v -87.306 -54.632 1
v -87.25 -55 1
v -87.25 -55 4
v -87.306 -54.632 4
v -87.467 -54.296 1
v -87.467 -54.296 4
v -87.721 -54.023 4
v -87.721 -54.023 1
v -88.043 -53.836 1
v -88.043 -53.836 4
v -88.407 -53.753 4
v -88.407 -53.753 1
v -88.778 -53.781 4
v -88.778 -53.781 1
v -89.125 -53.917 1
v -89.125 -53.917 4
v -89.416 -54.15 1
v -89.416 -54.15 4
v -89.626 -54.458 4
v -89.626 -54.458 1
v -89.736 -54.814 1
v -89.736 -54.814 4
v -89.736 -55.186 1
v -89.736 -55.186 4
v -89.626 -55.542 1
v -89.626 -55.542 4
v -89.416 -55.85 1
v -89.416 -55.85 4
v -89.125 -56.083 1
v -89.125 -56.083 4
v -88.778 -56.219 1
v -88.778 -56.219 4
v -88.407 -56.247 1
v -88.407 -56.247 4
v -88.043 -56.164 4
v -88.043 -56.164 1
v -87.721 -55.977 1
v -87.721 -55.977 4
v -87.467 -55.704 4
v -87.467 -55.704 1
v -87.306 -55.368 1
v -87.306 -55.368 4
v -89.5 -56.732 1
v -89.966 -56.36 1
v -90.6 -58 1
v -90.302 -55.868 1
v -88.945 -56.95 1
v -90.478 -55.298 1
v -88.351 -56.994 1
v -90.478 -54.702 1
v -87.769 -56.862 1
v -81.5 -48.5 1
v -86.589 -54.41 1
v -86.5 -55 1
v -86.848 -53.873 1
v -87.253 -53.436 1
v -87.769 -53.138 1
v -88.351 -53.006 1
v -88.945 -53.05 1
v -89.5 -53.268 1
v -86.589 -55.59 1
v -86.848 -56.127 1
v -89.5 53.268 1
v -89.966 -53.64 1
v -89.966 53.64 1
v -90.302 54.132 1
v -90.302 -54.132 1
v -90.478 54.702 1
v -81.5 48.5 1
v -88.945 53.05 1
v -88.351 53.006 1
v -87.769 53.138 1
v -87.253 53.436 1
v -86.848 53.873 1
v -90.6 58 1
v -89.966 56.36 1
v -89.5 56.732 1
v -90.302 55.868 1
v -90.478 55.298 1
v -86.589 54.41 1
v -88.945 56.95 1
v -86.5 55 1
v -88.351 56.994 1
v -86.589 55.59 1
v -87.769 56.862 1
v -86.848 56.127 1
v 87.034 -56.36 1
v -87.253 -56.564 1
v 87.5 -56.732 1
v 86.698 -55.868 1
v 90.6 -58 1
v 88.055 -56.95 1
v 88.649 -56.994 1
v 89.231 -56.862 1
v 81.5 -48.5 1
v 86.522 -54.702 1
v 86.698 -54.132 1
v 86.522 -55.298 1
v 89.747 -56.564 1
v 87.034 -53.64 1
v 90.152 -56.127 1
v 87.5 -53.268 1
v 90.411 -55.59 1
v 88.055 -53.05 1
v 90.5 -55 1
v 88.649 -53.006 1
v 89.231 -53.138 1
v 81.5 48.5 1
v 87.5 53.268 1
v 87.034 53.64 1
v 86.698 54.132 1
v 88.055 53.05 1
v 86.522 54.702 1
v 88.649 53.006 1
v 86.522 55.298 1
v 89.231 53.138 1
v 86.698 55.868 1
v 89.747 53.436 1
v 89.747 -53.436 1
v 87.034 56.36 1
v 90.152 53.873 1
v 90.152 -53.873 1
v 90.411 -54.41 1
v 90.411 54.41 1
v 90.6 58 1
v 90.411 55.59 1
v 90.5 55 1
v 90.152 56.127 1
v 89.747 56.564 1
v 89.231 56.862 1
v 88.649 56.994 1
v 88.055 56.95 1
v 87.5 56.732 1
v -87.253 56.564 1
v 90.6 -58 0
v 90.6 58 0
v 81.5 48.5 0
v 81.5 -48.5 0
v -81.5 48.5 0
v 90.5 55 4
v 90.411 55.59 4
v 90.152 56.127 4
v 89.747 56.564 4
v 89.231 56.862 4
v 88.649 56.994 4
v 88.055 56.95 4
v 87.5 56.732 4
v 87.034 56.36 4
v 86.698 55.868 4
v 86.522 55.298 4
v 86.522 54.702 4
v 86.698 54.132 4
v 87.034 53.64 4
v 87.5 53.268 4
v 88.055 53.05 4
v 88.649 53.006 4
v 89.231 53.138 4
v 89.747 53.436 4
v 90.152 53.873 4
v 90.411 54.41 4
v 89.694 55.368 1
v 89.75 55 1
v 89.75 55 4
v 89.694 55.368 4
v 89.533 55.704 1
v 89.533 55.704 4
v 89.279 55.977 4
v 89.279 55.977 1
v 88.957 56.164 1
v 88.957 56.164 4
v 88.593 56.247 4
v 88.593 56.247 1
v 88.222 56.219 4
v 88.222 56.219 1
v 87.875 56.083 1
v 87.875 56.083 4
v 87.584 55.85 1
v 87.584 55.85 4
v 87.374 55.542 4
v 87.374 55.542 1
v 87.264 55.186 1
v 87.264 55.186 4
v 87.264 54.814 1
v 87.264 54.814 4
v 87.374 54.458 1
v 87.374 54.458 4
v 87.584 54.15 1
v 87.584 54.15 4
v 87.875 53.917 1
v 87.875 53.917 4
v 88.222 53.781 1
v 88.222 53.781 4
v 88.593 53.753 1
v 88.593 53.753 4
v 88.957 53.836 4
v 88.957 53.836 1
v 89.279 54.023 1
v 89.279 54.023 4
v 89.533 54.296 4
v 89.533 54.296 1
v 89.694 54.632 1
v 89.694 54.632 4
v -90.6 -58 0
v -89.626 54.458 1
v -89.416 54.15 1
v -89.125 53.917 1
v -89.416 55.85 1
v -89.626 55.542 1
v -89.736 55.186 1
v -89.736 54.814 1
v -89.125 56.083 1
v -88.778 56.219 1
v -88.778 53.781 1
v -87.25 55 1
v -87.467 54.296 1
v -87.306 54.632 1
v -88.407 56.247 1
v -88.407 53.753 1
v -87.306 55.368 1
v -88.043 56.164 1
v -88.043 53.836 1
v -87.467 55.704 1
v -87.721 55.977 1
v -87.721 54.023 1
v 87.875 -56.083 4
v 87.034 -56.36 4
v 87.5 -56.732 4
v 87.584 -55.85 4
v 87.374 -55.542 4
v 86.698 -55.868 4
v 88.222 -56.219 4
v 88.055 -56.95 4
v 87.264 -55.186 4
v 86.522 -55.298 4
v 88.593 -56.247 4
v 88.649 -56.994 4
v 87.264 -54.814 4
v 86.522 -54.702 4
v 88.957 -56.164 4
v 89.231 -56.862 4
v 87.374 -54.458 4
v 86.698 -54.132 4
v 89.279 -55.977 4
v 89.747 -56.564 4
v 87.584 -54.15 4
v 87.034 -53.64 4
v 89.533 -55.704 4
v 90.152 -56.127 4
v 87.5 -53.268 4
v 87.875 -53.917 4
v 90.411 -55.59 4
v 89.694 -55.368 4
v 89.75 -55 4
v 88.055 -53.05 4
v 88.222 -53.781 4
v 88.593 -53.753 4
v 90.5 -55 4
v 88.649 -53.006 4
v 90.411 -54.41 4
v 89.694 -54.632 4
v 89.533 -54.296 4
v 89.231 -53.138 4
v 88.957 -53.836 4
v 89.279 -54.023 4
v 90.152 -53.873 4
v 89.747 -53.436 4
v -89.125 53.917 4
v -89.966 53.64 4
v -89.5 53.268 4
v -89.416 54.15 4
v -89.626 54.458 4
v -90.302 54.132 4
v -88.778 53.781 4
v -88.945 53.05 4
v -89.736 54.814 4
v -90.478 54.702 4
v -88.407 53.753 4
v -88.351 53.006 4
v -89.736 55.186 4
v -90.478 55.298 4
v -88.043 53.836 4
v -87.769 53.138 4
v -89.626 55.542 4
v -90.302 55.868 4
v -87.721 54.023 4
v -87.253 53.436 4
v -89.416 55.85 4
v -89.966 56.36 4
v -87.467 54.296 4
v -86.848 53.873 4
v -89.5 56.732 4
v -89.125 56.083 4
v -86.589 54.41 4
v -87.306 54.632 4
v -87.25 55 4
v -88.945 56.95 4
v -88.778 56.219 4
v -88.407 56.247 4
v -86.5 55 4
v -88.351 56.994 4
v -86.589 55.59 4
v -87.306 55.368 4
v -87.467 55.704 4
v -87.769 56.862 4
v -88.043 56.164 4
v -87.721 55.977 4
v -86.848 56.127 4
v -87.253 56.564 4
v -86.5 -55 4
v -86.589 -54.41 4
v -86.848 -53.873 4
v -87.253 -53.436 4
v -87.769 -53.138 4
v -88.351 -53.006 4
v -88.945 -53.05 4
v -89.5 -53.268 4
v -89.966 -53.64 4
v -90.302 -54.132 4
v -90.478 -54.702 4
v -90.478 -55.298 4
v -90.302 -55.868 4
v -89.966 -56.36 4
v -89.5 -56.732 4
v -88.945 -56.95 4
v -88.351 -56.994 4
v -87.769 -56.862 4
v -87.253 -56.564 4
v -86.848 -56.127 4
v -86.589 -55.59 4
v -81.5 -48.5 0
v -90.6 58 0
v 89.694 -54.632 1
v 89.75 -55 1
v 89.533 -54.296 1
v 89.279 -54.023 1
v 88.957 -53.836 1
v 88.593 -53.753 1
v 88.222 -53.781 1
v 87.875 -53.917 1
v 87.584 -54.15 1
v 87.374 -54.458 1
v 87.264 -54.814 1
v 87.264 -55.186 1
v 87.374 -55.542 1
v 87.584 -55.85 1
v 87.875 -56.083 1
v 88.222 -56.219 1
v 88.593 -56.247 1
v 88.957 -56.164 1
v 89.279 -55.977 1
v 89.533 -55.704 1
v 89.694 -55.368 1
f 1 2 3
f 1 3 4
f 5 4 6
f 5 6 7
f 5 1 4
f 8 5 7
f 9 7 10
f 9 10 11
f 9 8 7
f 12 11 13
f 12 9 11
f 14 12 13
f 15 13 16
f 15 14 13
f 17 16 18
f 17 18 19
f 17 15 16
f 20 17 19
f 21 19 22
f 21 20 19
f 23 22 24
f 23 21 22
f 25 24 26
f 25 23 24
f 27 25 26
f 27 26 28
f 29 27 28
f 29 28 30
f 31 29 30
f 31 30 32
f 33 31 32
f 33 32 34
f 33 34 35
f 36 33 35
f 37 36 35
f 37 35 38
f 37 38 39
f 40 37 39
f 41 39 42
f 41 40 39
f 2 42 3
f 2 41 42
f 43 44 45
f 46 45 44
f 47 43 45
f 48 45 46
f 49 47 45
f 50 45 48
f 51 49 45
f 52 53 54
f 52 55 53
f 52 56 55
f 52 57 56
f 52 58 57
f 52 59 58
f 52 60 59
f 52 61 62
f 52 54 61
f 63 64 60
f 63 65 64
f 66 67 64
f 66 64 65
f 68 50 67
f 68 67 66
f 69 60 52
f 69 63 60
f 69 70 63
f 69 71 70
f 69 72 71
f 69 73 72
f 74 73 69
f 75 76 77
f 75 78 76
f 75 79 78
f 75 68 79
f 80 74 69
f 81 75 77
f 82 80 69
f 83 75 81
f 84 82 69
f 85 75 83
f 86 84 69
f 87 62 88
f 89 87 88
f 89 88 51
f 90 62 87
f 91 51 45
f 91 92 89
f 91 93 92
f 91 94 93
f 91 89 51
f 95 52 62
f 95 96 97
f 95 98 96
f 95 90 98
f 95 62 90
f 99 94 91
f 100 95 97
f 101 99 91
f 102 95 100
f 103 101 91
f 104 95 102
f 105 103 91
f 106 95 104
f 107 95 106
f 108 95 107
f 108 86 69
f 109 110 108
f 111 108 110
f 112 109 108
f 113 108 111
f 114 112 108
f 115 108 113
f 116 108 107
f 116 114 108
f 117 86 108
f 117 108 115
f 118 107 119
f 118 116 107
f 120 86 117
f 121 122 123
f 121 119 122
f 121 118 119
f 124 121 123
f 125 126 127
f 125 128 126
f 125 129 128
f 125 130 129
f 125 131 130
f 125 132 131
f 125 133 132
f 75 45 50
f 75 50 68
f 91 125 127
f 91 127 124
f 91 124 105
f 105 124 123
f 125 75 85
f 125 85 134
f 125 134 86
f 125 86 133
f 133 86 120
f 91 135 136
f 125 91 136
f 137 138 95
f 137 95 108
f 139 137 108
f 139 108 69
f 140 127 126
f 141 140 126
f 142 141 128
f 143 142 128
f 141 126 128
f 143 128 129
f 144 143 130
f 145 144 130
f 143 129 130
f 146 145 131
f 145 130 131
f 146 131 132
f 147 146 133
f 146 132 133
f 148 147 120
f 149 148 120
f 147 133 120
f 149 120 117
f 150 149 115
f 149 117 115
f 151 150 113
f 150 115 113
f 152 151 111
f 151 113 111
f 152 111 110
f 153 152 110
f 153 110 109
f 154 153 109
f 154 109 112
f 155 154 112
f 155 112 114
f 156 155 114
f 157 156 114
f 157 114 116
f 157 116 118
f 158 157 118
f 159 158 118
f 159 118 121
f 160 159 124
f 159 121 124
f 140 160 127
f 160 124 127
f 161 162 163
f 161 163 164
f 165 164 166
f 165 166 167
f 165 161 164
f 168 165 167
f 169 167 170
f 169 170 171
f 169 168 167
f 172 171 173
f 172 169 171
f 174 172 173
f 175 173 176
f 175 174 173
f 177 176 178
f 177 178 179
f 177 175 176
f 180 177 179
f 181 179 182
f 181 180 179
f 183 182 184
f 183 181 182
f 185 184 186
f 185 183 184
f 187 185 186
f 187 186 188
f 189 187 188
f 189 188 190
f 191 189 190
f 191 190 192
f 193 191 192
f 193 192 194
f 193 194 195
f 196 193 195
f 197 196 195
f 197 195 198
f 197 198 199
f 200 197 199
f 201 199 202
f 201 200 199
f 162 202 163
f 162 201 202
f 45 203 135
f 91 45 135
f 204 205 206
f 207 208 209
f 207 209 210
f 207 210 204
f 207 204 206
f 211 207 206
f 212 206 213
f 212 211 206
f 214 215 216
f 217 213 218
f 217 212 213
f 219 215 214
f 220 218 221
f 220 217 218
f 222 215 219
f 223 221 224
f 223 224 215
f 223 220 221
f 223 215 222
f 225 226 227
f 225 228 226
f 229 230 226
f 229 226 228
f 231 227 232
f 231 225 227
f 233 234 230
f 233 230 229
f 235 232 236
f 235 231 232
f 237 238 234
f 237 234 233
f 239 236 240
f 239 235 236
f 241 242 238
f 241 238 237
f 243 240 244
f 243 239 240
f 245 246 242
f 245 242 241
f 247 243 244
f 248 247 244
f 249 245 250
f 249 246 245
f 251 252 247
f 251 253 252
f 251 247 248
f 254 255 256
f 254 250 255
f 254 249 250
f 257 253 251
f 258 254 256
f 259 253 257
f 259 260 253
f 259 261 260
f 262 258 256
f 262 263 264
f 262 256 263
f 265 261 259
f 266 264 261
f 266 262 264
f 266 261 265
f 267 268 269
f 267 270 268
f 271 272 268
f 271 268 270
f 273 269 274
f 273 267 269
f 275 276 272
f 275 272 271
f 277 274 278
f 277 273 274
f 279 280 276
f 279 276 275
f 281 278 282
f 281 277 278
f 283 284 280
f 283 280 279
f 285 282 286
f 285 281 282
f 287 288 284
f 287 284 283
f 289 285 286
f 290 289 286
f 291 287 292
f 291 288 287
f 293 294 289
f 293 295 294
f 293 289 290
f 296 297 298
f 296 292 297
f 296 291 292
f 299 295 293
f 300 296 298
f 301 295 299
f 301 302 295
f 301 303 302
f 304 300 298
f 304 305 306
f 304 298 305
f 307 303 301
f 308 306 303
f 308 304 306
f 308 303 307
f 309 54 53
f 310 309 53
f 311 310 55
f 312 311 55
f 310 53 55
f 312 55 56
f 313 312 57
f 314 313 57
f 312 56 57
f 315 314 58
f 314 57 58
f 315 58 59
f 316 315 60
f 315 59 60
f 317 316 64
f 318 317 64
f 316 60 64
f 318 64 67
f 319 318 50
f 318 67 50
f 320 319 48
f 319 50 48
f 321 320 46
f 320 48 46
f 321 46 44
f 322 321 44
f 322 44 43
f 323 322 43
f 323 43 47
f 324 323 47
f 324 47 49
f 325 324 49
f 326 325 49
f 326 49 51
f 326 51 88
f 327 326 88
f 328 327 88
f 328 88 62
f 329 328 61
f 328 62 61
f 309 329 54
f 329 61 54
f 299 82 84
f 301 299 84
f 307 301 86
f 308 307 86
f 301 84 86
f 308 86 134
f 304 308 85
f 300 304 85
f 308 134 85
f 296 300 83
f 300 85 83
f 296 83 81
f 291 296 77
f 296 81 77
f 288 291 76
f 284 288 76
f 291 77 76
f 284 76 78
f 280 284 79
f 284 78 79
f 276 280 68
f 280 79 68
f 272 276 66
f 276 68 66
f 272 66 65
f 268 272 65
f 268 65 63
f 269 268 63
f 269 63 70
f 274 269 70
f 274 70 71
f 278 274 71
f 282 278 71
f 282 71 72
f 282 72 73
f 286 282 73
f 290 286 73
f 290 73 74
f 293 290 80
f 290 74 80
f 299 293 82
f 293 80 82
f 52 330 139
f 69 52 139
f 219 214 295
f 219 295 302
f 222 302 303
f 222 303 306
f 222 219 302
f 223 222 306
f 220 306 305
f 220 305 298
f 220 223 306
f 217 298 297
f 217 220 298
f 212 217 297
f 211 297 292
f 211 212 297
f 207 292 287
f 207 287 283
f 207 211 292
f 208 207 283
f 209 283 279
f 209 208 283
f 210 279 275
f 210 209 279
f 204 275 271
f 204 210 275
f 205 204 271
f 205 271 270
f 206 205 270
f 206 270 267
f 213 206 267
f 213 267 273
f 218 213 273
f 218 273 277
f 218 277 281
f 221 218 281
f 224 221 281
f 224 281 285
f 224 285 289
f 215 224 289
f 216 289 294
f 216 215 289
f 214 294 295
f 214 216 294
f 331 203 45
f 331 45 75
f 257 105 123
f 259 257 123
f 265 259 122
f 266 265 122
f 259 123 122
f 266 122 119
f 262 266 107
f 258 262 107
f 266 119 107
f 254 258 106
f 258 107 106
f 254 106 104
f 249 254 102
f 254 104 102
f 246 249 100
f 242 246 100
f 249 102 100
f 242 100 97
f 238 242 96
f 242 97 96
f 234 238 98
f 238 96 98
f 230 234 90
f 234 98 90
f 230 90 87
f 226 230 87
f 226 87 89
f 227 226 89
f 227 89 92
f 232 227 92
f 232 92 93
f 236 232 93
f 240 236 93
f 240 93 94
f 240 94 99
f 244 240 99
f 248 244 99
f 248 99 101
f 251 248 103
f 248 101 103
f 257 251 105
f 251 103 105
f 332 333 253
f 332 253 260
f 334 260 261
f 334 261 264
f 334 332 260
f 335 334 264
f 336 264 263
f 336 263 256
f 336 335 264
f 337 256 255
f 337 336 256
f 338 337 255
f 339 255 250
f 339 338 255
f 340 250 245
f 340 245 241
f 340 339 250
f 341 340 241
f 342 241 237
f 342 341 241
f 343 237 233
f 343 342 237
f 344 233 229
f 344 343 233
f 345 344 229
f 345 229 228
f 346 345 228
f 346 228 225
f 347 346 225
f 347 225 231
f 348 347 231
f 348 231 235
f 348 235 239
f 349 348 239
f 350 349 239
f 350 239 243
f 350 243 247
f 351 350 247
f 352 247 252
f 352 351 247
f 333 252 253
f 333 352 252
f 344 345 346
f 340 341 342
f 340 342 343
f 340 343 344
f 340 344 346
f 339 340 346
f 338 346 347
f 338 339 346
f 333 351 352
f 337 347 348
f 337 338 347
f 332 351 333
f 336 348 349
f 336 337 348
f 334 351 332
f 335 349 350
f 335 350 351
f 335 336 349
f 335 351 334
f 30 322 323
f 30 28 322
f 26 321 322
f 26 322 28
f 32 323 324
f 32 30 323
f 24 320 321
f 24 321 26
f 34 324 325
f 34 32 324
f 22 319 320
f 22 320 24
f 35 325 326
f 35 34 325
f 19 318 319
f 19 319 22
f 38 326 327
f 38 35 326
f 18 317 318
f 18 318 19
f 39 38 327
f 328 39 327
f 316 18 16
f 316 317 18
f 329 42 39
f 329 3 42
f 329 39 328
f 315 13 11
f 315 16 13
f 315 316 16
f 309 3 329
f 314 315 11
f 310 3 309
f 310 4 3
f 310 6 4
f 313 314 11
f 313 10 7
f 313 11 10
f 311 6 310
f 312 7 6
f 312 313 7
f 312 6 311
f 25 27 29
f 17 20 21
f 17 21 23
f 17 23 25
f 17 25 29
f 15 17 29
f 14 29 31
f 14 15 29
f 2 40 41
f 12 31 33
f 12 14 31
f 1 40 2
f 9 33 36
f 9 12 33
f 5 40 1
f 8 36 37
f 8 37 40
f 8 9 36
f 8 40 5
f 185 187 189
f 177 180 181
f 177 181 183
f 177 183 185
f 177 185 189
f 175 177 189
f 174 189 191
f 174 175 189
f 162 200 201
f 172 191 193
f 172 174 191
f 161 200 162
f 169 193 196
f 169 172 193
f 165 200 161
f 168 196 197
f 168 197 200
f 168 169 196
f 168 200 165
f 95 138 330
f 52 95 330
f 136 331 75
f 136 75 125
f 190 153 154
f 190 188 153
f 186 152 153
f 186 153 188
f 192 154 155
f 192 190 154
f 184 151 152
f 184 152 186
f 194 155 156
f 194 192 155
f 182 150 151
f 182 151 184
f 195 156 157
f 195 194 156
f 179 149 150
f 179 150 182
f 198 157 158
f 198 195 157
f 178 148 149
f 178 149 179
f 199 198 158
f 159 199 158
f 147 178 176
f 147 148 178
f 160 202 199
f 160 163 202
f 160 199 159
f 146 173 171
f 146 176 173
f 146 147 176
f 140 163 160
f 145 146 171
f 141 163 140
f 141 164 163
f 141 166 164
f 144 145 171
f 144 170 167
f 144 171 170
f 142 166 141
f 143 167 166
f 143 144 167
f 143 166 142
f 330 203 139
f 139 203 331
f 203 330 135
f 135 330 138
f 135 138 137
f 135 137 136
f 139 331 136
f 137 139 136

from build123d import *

# Parameters (mm, degrees)
SKETCH_1_W          = 181.2
SKETCH_1_H          = 116
EXTRUDE_1_DEPTH     = 1
SKETCH_2_R          = 2
SKETCH_2_R_2        = 1.25
EXTRUDE_2_DEPTH     = 3
SKETCH_3_W          = 163
SKETCH_3_H          = 97
CUT_EXTRUDE_2_DEPTH = 3


with BuildPart() as part:
    # 草图1 → 凸台-拉伸1 (new body)
    with BuildSketch(Plane.XY):
        Rectangle(SKETCH_1_W, SKETCH_1_H)
    extrude(amount=EXTRUDE_1_DEPTH)

    # 草图2 → 凸台-拉伸2 (add)
    # profile 1 of 4: a face of its own
    with BuildSketch(Plane.XY.offset(1)):
        with Locations((-88.5, 55)):
            Circle(SKETCH_2_R)
        with Locations((-88.5, 55)):
            Circle(SKETCH_2_R_2, mode=Mode.SUBTRACT)
    # profile 2 of 4: a face of its own
    with BuildSketch(Plane.XY.offset(1)):
        with Locations((88.5, 55)):
            Circle(SKETCH_2_R)
        with Locations((88.5, 55)):
            Circle(SKETCH_2_R_2, mode=Mode.SUBTRACT)
    # profile 3 of 4: a face of its own
    with BuildSketch(Plane.XY.offset(1)):
        with Locations((88.5, -55)):
            Circle(SKETCH_2_R)
        with Locations((88.5, -55)):
            Circle(SKETCH_2_R_2, mode=Mode.SUBTRACT)
    # profile 4 of 4: a face of its own
    with BuildSketch(Plane.XY.offset(1)):
        with Locations((-88.5, -55)):
            Circle(SKETCH_2_R)
        with Locations((-88.5, -55)):
            Circle(SKETCH_2_R_2, mode=Mode.SUBTRACT)
    extrude(amount=EXTRUDE_2_DEPTH)

    # 草图3 → 切除-拉伸2 (cut)
    with BuildSketch(Plane(origin=(0, 0, 0), x_dir=(-1, 0, 0), z_dir=(0, 0, -1))):
        Rectangle(SKETCH_3_W, SKETCH_3_H)
    extrude(amount=-CUT_EXTRUDE_2_DEPTH, mode=Mode.SUBTRACT)


solid = part.part
